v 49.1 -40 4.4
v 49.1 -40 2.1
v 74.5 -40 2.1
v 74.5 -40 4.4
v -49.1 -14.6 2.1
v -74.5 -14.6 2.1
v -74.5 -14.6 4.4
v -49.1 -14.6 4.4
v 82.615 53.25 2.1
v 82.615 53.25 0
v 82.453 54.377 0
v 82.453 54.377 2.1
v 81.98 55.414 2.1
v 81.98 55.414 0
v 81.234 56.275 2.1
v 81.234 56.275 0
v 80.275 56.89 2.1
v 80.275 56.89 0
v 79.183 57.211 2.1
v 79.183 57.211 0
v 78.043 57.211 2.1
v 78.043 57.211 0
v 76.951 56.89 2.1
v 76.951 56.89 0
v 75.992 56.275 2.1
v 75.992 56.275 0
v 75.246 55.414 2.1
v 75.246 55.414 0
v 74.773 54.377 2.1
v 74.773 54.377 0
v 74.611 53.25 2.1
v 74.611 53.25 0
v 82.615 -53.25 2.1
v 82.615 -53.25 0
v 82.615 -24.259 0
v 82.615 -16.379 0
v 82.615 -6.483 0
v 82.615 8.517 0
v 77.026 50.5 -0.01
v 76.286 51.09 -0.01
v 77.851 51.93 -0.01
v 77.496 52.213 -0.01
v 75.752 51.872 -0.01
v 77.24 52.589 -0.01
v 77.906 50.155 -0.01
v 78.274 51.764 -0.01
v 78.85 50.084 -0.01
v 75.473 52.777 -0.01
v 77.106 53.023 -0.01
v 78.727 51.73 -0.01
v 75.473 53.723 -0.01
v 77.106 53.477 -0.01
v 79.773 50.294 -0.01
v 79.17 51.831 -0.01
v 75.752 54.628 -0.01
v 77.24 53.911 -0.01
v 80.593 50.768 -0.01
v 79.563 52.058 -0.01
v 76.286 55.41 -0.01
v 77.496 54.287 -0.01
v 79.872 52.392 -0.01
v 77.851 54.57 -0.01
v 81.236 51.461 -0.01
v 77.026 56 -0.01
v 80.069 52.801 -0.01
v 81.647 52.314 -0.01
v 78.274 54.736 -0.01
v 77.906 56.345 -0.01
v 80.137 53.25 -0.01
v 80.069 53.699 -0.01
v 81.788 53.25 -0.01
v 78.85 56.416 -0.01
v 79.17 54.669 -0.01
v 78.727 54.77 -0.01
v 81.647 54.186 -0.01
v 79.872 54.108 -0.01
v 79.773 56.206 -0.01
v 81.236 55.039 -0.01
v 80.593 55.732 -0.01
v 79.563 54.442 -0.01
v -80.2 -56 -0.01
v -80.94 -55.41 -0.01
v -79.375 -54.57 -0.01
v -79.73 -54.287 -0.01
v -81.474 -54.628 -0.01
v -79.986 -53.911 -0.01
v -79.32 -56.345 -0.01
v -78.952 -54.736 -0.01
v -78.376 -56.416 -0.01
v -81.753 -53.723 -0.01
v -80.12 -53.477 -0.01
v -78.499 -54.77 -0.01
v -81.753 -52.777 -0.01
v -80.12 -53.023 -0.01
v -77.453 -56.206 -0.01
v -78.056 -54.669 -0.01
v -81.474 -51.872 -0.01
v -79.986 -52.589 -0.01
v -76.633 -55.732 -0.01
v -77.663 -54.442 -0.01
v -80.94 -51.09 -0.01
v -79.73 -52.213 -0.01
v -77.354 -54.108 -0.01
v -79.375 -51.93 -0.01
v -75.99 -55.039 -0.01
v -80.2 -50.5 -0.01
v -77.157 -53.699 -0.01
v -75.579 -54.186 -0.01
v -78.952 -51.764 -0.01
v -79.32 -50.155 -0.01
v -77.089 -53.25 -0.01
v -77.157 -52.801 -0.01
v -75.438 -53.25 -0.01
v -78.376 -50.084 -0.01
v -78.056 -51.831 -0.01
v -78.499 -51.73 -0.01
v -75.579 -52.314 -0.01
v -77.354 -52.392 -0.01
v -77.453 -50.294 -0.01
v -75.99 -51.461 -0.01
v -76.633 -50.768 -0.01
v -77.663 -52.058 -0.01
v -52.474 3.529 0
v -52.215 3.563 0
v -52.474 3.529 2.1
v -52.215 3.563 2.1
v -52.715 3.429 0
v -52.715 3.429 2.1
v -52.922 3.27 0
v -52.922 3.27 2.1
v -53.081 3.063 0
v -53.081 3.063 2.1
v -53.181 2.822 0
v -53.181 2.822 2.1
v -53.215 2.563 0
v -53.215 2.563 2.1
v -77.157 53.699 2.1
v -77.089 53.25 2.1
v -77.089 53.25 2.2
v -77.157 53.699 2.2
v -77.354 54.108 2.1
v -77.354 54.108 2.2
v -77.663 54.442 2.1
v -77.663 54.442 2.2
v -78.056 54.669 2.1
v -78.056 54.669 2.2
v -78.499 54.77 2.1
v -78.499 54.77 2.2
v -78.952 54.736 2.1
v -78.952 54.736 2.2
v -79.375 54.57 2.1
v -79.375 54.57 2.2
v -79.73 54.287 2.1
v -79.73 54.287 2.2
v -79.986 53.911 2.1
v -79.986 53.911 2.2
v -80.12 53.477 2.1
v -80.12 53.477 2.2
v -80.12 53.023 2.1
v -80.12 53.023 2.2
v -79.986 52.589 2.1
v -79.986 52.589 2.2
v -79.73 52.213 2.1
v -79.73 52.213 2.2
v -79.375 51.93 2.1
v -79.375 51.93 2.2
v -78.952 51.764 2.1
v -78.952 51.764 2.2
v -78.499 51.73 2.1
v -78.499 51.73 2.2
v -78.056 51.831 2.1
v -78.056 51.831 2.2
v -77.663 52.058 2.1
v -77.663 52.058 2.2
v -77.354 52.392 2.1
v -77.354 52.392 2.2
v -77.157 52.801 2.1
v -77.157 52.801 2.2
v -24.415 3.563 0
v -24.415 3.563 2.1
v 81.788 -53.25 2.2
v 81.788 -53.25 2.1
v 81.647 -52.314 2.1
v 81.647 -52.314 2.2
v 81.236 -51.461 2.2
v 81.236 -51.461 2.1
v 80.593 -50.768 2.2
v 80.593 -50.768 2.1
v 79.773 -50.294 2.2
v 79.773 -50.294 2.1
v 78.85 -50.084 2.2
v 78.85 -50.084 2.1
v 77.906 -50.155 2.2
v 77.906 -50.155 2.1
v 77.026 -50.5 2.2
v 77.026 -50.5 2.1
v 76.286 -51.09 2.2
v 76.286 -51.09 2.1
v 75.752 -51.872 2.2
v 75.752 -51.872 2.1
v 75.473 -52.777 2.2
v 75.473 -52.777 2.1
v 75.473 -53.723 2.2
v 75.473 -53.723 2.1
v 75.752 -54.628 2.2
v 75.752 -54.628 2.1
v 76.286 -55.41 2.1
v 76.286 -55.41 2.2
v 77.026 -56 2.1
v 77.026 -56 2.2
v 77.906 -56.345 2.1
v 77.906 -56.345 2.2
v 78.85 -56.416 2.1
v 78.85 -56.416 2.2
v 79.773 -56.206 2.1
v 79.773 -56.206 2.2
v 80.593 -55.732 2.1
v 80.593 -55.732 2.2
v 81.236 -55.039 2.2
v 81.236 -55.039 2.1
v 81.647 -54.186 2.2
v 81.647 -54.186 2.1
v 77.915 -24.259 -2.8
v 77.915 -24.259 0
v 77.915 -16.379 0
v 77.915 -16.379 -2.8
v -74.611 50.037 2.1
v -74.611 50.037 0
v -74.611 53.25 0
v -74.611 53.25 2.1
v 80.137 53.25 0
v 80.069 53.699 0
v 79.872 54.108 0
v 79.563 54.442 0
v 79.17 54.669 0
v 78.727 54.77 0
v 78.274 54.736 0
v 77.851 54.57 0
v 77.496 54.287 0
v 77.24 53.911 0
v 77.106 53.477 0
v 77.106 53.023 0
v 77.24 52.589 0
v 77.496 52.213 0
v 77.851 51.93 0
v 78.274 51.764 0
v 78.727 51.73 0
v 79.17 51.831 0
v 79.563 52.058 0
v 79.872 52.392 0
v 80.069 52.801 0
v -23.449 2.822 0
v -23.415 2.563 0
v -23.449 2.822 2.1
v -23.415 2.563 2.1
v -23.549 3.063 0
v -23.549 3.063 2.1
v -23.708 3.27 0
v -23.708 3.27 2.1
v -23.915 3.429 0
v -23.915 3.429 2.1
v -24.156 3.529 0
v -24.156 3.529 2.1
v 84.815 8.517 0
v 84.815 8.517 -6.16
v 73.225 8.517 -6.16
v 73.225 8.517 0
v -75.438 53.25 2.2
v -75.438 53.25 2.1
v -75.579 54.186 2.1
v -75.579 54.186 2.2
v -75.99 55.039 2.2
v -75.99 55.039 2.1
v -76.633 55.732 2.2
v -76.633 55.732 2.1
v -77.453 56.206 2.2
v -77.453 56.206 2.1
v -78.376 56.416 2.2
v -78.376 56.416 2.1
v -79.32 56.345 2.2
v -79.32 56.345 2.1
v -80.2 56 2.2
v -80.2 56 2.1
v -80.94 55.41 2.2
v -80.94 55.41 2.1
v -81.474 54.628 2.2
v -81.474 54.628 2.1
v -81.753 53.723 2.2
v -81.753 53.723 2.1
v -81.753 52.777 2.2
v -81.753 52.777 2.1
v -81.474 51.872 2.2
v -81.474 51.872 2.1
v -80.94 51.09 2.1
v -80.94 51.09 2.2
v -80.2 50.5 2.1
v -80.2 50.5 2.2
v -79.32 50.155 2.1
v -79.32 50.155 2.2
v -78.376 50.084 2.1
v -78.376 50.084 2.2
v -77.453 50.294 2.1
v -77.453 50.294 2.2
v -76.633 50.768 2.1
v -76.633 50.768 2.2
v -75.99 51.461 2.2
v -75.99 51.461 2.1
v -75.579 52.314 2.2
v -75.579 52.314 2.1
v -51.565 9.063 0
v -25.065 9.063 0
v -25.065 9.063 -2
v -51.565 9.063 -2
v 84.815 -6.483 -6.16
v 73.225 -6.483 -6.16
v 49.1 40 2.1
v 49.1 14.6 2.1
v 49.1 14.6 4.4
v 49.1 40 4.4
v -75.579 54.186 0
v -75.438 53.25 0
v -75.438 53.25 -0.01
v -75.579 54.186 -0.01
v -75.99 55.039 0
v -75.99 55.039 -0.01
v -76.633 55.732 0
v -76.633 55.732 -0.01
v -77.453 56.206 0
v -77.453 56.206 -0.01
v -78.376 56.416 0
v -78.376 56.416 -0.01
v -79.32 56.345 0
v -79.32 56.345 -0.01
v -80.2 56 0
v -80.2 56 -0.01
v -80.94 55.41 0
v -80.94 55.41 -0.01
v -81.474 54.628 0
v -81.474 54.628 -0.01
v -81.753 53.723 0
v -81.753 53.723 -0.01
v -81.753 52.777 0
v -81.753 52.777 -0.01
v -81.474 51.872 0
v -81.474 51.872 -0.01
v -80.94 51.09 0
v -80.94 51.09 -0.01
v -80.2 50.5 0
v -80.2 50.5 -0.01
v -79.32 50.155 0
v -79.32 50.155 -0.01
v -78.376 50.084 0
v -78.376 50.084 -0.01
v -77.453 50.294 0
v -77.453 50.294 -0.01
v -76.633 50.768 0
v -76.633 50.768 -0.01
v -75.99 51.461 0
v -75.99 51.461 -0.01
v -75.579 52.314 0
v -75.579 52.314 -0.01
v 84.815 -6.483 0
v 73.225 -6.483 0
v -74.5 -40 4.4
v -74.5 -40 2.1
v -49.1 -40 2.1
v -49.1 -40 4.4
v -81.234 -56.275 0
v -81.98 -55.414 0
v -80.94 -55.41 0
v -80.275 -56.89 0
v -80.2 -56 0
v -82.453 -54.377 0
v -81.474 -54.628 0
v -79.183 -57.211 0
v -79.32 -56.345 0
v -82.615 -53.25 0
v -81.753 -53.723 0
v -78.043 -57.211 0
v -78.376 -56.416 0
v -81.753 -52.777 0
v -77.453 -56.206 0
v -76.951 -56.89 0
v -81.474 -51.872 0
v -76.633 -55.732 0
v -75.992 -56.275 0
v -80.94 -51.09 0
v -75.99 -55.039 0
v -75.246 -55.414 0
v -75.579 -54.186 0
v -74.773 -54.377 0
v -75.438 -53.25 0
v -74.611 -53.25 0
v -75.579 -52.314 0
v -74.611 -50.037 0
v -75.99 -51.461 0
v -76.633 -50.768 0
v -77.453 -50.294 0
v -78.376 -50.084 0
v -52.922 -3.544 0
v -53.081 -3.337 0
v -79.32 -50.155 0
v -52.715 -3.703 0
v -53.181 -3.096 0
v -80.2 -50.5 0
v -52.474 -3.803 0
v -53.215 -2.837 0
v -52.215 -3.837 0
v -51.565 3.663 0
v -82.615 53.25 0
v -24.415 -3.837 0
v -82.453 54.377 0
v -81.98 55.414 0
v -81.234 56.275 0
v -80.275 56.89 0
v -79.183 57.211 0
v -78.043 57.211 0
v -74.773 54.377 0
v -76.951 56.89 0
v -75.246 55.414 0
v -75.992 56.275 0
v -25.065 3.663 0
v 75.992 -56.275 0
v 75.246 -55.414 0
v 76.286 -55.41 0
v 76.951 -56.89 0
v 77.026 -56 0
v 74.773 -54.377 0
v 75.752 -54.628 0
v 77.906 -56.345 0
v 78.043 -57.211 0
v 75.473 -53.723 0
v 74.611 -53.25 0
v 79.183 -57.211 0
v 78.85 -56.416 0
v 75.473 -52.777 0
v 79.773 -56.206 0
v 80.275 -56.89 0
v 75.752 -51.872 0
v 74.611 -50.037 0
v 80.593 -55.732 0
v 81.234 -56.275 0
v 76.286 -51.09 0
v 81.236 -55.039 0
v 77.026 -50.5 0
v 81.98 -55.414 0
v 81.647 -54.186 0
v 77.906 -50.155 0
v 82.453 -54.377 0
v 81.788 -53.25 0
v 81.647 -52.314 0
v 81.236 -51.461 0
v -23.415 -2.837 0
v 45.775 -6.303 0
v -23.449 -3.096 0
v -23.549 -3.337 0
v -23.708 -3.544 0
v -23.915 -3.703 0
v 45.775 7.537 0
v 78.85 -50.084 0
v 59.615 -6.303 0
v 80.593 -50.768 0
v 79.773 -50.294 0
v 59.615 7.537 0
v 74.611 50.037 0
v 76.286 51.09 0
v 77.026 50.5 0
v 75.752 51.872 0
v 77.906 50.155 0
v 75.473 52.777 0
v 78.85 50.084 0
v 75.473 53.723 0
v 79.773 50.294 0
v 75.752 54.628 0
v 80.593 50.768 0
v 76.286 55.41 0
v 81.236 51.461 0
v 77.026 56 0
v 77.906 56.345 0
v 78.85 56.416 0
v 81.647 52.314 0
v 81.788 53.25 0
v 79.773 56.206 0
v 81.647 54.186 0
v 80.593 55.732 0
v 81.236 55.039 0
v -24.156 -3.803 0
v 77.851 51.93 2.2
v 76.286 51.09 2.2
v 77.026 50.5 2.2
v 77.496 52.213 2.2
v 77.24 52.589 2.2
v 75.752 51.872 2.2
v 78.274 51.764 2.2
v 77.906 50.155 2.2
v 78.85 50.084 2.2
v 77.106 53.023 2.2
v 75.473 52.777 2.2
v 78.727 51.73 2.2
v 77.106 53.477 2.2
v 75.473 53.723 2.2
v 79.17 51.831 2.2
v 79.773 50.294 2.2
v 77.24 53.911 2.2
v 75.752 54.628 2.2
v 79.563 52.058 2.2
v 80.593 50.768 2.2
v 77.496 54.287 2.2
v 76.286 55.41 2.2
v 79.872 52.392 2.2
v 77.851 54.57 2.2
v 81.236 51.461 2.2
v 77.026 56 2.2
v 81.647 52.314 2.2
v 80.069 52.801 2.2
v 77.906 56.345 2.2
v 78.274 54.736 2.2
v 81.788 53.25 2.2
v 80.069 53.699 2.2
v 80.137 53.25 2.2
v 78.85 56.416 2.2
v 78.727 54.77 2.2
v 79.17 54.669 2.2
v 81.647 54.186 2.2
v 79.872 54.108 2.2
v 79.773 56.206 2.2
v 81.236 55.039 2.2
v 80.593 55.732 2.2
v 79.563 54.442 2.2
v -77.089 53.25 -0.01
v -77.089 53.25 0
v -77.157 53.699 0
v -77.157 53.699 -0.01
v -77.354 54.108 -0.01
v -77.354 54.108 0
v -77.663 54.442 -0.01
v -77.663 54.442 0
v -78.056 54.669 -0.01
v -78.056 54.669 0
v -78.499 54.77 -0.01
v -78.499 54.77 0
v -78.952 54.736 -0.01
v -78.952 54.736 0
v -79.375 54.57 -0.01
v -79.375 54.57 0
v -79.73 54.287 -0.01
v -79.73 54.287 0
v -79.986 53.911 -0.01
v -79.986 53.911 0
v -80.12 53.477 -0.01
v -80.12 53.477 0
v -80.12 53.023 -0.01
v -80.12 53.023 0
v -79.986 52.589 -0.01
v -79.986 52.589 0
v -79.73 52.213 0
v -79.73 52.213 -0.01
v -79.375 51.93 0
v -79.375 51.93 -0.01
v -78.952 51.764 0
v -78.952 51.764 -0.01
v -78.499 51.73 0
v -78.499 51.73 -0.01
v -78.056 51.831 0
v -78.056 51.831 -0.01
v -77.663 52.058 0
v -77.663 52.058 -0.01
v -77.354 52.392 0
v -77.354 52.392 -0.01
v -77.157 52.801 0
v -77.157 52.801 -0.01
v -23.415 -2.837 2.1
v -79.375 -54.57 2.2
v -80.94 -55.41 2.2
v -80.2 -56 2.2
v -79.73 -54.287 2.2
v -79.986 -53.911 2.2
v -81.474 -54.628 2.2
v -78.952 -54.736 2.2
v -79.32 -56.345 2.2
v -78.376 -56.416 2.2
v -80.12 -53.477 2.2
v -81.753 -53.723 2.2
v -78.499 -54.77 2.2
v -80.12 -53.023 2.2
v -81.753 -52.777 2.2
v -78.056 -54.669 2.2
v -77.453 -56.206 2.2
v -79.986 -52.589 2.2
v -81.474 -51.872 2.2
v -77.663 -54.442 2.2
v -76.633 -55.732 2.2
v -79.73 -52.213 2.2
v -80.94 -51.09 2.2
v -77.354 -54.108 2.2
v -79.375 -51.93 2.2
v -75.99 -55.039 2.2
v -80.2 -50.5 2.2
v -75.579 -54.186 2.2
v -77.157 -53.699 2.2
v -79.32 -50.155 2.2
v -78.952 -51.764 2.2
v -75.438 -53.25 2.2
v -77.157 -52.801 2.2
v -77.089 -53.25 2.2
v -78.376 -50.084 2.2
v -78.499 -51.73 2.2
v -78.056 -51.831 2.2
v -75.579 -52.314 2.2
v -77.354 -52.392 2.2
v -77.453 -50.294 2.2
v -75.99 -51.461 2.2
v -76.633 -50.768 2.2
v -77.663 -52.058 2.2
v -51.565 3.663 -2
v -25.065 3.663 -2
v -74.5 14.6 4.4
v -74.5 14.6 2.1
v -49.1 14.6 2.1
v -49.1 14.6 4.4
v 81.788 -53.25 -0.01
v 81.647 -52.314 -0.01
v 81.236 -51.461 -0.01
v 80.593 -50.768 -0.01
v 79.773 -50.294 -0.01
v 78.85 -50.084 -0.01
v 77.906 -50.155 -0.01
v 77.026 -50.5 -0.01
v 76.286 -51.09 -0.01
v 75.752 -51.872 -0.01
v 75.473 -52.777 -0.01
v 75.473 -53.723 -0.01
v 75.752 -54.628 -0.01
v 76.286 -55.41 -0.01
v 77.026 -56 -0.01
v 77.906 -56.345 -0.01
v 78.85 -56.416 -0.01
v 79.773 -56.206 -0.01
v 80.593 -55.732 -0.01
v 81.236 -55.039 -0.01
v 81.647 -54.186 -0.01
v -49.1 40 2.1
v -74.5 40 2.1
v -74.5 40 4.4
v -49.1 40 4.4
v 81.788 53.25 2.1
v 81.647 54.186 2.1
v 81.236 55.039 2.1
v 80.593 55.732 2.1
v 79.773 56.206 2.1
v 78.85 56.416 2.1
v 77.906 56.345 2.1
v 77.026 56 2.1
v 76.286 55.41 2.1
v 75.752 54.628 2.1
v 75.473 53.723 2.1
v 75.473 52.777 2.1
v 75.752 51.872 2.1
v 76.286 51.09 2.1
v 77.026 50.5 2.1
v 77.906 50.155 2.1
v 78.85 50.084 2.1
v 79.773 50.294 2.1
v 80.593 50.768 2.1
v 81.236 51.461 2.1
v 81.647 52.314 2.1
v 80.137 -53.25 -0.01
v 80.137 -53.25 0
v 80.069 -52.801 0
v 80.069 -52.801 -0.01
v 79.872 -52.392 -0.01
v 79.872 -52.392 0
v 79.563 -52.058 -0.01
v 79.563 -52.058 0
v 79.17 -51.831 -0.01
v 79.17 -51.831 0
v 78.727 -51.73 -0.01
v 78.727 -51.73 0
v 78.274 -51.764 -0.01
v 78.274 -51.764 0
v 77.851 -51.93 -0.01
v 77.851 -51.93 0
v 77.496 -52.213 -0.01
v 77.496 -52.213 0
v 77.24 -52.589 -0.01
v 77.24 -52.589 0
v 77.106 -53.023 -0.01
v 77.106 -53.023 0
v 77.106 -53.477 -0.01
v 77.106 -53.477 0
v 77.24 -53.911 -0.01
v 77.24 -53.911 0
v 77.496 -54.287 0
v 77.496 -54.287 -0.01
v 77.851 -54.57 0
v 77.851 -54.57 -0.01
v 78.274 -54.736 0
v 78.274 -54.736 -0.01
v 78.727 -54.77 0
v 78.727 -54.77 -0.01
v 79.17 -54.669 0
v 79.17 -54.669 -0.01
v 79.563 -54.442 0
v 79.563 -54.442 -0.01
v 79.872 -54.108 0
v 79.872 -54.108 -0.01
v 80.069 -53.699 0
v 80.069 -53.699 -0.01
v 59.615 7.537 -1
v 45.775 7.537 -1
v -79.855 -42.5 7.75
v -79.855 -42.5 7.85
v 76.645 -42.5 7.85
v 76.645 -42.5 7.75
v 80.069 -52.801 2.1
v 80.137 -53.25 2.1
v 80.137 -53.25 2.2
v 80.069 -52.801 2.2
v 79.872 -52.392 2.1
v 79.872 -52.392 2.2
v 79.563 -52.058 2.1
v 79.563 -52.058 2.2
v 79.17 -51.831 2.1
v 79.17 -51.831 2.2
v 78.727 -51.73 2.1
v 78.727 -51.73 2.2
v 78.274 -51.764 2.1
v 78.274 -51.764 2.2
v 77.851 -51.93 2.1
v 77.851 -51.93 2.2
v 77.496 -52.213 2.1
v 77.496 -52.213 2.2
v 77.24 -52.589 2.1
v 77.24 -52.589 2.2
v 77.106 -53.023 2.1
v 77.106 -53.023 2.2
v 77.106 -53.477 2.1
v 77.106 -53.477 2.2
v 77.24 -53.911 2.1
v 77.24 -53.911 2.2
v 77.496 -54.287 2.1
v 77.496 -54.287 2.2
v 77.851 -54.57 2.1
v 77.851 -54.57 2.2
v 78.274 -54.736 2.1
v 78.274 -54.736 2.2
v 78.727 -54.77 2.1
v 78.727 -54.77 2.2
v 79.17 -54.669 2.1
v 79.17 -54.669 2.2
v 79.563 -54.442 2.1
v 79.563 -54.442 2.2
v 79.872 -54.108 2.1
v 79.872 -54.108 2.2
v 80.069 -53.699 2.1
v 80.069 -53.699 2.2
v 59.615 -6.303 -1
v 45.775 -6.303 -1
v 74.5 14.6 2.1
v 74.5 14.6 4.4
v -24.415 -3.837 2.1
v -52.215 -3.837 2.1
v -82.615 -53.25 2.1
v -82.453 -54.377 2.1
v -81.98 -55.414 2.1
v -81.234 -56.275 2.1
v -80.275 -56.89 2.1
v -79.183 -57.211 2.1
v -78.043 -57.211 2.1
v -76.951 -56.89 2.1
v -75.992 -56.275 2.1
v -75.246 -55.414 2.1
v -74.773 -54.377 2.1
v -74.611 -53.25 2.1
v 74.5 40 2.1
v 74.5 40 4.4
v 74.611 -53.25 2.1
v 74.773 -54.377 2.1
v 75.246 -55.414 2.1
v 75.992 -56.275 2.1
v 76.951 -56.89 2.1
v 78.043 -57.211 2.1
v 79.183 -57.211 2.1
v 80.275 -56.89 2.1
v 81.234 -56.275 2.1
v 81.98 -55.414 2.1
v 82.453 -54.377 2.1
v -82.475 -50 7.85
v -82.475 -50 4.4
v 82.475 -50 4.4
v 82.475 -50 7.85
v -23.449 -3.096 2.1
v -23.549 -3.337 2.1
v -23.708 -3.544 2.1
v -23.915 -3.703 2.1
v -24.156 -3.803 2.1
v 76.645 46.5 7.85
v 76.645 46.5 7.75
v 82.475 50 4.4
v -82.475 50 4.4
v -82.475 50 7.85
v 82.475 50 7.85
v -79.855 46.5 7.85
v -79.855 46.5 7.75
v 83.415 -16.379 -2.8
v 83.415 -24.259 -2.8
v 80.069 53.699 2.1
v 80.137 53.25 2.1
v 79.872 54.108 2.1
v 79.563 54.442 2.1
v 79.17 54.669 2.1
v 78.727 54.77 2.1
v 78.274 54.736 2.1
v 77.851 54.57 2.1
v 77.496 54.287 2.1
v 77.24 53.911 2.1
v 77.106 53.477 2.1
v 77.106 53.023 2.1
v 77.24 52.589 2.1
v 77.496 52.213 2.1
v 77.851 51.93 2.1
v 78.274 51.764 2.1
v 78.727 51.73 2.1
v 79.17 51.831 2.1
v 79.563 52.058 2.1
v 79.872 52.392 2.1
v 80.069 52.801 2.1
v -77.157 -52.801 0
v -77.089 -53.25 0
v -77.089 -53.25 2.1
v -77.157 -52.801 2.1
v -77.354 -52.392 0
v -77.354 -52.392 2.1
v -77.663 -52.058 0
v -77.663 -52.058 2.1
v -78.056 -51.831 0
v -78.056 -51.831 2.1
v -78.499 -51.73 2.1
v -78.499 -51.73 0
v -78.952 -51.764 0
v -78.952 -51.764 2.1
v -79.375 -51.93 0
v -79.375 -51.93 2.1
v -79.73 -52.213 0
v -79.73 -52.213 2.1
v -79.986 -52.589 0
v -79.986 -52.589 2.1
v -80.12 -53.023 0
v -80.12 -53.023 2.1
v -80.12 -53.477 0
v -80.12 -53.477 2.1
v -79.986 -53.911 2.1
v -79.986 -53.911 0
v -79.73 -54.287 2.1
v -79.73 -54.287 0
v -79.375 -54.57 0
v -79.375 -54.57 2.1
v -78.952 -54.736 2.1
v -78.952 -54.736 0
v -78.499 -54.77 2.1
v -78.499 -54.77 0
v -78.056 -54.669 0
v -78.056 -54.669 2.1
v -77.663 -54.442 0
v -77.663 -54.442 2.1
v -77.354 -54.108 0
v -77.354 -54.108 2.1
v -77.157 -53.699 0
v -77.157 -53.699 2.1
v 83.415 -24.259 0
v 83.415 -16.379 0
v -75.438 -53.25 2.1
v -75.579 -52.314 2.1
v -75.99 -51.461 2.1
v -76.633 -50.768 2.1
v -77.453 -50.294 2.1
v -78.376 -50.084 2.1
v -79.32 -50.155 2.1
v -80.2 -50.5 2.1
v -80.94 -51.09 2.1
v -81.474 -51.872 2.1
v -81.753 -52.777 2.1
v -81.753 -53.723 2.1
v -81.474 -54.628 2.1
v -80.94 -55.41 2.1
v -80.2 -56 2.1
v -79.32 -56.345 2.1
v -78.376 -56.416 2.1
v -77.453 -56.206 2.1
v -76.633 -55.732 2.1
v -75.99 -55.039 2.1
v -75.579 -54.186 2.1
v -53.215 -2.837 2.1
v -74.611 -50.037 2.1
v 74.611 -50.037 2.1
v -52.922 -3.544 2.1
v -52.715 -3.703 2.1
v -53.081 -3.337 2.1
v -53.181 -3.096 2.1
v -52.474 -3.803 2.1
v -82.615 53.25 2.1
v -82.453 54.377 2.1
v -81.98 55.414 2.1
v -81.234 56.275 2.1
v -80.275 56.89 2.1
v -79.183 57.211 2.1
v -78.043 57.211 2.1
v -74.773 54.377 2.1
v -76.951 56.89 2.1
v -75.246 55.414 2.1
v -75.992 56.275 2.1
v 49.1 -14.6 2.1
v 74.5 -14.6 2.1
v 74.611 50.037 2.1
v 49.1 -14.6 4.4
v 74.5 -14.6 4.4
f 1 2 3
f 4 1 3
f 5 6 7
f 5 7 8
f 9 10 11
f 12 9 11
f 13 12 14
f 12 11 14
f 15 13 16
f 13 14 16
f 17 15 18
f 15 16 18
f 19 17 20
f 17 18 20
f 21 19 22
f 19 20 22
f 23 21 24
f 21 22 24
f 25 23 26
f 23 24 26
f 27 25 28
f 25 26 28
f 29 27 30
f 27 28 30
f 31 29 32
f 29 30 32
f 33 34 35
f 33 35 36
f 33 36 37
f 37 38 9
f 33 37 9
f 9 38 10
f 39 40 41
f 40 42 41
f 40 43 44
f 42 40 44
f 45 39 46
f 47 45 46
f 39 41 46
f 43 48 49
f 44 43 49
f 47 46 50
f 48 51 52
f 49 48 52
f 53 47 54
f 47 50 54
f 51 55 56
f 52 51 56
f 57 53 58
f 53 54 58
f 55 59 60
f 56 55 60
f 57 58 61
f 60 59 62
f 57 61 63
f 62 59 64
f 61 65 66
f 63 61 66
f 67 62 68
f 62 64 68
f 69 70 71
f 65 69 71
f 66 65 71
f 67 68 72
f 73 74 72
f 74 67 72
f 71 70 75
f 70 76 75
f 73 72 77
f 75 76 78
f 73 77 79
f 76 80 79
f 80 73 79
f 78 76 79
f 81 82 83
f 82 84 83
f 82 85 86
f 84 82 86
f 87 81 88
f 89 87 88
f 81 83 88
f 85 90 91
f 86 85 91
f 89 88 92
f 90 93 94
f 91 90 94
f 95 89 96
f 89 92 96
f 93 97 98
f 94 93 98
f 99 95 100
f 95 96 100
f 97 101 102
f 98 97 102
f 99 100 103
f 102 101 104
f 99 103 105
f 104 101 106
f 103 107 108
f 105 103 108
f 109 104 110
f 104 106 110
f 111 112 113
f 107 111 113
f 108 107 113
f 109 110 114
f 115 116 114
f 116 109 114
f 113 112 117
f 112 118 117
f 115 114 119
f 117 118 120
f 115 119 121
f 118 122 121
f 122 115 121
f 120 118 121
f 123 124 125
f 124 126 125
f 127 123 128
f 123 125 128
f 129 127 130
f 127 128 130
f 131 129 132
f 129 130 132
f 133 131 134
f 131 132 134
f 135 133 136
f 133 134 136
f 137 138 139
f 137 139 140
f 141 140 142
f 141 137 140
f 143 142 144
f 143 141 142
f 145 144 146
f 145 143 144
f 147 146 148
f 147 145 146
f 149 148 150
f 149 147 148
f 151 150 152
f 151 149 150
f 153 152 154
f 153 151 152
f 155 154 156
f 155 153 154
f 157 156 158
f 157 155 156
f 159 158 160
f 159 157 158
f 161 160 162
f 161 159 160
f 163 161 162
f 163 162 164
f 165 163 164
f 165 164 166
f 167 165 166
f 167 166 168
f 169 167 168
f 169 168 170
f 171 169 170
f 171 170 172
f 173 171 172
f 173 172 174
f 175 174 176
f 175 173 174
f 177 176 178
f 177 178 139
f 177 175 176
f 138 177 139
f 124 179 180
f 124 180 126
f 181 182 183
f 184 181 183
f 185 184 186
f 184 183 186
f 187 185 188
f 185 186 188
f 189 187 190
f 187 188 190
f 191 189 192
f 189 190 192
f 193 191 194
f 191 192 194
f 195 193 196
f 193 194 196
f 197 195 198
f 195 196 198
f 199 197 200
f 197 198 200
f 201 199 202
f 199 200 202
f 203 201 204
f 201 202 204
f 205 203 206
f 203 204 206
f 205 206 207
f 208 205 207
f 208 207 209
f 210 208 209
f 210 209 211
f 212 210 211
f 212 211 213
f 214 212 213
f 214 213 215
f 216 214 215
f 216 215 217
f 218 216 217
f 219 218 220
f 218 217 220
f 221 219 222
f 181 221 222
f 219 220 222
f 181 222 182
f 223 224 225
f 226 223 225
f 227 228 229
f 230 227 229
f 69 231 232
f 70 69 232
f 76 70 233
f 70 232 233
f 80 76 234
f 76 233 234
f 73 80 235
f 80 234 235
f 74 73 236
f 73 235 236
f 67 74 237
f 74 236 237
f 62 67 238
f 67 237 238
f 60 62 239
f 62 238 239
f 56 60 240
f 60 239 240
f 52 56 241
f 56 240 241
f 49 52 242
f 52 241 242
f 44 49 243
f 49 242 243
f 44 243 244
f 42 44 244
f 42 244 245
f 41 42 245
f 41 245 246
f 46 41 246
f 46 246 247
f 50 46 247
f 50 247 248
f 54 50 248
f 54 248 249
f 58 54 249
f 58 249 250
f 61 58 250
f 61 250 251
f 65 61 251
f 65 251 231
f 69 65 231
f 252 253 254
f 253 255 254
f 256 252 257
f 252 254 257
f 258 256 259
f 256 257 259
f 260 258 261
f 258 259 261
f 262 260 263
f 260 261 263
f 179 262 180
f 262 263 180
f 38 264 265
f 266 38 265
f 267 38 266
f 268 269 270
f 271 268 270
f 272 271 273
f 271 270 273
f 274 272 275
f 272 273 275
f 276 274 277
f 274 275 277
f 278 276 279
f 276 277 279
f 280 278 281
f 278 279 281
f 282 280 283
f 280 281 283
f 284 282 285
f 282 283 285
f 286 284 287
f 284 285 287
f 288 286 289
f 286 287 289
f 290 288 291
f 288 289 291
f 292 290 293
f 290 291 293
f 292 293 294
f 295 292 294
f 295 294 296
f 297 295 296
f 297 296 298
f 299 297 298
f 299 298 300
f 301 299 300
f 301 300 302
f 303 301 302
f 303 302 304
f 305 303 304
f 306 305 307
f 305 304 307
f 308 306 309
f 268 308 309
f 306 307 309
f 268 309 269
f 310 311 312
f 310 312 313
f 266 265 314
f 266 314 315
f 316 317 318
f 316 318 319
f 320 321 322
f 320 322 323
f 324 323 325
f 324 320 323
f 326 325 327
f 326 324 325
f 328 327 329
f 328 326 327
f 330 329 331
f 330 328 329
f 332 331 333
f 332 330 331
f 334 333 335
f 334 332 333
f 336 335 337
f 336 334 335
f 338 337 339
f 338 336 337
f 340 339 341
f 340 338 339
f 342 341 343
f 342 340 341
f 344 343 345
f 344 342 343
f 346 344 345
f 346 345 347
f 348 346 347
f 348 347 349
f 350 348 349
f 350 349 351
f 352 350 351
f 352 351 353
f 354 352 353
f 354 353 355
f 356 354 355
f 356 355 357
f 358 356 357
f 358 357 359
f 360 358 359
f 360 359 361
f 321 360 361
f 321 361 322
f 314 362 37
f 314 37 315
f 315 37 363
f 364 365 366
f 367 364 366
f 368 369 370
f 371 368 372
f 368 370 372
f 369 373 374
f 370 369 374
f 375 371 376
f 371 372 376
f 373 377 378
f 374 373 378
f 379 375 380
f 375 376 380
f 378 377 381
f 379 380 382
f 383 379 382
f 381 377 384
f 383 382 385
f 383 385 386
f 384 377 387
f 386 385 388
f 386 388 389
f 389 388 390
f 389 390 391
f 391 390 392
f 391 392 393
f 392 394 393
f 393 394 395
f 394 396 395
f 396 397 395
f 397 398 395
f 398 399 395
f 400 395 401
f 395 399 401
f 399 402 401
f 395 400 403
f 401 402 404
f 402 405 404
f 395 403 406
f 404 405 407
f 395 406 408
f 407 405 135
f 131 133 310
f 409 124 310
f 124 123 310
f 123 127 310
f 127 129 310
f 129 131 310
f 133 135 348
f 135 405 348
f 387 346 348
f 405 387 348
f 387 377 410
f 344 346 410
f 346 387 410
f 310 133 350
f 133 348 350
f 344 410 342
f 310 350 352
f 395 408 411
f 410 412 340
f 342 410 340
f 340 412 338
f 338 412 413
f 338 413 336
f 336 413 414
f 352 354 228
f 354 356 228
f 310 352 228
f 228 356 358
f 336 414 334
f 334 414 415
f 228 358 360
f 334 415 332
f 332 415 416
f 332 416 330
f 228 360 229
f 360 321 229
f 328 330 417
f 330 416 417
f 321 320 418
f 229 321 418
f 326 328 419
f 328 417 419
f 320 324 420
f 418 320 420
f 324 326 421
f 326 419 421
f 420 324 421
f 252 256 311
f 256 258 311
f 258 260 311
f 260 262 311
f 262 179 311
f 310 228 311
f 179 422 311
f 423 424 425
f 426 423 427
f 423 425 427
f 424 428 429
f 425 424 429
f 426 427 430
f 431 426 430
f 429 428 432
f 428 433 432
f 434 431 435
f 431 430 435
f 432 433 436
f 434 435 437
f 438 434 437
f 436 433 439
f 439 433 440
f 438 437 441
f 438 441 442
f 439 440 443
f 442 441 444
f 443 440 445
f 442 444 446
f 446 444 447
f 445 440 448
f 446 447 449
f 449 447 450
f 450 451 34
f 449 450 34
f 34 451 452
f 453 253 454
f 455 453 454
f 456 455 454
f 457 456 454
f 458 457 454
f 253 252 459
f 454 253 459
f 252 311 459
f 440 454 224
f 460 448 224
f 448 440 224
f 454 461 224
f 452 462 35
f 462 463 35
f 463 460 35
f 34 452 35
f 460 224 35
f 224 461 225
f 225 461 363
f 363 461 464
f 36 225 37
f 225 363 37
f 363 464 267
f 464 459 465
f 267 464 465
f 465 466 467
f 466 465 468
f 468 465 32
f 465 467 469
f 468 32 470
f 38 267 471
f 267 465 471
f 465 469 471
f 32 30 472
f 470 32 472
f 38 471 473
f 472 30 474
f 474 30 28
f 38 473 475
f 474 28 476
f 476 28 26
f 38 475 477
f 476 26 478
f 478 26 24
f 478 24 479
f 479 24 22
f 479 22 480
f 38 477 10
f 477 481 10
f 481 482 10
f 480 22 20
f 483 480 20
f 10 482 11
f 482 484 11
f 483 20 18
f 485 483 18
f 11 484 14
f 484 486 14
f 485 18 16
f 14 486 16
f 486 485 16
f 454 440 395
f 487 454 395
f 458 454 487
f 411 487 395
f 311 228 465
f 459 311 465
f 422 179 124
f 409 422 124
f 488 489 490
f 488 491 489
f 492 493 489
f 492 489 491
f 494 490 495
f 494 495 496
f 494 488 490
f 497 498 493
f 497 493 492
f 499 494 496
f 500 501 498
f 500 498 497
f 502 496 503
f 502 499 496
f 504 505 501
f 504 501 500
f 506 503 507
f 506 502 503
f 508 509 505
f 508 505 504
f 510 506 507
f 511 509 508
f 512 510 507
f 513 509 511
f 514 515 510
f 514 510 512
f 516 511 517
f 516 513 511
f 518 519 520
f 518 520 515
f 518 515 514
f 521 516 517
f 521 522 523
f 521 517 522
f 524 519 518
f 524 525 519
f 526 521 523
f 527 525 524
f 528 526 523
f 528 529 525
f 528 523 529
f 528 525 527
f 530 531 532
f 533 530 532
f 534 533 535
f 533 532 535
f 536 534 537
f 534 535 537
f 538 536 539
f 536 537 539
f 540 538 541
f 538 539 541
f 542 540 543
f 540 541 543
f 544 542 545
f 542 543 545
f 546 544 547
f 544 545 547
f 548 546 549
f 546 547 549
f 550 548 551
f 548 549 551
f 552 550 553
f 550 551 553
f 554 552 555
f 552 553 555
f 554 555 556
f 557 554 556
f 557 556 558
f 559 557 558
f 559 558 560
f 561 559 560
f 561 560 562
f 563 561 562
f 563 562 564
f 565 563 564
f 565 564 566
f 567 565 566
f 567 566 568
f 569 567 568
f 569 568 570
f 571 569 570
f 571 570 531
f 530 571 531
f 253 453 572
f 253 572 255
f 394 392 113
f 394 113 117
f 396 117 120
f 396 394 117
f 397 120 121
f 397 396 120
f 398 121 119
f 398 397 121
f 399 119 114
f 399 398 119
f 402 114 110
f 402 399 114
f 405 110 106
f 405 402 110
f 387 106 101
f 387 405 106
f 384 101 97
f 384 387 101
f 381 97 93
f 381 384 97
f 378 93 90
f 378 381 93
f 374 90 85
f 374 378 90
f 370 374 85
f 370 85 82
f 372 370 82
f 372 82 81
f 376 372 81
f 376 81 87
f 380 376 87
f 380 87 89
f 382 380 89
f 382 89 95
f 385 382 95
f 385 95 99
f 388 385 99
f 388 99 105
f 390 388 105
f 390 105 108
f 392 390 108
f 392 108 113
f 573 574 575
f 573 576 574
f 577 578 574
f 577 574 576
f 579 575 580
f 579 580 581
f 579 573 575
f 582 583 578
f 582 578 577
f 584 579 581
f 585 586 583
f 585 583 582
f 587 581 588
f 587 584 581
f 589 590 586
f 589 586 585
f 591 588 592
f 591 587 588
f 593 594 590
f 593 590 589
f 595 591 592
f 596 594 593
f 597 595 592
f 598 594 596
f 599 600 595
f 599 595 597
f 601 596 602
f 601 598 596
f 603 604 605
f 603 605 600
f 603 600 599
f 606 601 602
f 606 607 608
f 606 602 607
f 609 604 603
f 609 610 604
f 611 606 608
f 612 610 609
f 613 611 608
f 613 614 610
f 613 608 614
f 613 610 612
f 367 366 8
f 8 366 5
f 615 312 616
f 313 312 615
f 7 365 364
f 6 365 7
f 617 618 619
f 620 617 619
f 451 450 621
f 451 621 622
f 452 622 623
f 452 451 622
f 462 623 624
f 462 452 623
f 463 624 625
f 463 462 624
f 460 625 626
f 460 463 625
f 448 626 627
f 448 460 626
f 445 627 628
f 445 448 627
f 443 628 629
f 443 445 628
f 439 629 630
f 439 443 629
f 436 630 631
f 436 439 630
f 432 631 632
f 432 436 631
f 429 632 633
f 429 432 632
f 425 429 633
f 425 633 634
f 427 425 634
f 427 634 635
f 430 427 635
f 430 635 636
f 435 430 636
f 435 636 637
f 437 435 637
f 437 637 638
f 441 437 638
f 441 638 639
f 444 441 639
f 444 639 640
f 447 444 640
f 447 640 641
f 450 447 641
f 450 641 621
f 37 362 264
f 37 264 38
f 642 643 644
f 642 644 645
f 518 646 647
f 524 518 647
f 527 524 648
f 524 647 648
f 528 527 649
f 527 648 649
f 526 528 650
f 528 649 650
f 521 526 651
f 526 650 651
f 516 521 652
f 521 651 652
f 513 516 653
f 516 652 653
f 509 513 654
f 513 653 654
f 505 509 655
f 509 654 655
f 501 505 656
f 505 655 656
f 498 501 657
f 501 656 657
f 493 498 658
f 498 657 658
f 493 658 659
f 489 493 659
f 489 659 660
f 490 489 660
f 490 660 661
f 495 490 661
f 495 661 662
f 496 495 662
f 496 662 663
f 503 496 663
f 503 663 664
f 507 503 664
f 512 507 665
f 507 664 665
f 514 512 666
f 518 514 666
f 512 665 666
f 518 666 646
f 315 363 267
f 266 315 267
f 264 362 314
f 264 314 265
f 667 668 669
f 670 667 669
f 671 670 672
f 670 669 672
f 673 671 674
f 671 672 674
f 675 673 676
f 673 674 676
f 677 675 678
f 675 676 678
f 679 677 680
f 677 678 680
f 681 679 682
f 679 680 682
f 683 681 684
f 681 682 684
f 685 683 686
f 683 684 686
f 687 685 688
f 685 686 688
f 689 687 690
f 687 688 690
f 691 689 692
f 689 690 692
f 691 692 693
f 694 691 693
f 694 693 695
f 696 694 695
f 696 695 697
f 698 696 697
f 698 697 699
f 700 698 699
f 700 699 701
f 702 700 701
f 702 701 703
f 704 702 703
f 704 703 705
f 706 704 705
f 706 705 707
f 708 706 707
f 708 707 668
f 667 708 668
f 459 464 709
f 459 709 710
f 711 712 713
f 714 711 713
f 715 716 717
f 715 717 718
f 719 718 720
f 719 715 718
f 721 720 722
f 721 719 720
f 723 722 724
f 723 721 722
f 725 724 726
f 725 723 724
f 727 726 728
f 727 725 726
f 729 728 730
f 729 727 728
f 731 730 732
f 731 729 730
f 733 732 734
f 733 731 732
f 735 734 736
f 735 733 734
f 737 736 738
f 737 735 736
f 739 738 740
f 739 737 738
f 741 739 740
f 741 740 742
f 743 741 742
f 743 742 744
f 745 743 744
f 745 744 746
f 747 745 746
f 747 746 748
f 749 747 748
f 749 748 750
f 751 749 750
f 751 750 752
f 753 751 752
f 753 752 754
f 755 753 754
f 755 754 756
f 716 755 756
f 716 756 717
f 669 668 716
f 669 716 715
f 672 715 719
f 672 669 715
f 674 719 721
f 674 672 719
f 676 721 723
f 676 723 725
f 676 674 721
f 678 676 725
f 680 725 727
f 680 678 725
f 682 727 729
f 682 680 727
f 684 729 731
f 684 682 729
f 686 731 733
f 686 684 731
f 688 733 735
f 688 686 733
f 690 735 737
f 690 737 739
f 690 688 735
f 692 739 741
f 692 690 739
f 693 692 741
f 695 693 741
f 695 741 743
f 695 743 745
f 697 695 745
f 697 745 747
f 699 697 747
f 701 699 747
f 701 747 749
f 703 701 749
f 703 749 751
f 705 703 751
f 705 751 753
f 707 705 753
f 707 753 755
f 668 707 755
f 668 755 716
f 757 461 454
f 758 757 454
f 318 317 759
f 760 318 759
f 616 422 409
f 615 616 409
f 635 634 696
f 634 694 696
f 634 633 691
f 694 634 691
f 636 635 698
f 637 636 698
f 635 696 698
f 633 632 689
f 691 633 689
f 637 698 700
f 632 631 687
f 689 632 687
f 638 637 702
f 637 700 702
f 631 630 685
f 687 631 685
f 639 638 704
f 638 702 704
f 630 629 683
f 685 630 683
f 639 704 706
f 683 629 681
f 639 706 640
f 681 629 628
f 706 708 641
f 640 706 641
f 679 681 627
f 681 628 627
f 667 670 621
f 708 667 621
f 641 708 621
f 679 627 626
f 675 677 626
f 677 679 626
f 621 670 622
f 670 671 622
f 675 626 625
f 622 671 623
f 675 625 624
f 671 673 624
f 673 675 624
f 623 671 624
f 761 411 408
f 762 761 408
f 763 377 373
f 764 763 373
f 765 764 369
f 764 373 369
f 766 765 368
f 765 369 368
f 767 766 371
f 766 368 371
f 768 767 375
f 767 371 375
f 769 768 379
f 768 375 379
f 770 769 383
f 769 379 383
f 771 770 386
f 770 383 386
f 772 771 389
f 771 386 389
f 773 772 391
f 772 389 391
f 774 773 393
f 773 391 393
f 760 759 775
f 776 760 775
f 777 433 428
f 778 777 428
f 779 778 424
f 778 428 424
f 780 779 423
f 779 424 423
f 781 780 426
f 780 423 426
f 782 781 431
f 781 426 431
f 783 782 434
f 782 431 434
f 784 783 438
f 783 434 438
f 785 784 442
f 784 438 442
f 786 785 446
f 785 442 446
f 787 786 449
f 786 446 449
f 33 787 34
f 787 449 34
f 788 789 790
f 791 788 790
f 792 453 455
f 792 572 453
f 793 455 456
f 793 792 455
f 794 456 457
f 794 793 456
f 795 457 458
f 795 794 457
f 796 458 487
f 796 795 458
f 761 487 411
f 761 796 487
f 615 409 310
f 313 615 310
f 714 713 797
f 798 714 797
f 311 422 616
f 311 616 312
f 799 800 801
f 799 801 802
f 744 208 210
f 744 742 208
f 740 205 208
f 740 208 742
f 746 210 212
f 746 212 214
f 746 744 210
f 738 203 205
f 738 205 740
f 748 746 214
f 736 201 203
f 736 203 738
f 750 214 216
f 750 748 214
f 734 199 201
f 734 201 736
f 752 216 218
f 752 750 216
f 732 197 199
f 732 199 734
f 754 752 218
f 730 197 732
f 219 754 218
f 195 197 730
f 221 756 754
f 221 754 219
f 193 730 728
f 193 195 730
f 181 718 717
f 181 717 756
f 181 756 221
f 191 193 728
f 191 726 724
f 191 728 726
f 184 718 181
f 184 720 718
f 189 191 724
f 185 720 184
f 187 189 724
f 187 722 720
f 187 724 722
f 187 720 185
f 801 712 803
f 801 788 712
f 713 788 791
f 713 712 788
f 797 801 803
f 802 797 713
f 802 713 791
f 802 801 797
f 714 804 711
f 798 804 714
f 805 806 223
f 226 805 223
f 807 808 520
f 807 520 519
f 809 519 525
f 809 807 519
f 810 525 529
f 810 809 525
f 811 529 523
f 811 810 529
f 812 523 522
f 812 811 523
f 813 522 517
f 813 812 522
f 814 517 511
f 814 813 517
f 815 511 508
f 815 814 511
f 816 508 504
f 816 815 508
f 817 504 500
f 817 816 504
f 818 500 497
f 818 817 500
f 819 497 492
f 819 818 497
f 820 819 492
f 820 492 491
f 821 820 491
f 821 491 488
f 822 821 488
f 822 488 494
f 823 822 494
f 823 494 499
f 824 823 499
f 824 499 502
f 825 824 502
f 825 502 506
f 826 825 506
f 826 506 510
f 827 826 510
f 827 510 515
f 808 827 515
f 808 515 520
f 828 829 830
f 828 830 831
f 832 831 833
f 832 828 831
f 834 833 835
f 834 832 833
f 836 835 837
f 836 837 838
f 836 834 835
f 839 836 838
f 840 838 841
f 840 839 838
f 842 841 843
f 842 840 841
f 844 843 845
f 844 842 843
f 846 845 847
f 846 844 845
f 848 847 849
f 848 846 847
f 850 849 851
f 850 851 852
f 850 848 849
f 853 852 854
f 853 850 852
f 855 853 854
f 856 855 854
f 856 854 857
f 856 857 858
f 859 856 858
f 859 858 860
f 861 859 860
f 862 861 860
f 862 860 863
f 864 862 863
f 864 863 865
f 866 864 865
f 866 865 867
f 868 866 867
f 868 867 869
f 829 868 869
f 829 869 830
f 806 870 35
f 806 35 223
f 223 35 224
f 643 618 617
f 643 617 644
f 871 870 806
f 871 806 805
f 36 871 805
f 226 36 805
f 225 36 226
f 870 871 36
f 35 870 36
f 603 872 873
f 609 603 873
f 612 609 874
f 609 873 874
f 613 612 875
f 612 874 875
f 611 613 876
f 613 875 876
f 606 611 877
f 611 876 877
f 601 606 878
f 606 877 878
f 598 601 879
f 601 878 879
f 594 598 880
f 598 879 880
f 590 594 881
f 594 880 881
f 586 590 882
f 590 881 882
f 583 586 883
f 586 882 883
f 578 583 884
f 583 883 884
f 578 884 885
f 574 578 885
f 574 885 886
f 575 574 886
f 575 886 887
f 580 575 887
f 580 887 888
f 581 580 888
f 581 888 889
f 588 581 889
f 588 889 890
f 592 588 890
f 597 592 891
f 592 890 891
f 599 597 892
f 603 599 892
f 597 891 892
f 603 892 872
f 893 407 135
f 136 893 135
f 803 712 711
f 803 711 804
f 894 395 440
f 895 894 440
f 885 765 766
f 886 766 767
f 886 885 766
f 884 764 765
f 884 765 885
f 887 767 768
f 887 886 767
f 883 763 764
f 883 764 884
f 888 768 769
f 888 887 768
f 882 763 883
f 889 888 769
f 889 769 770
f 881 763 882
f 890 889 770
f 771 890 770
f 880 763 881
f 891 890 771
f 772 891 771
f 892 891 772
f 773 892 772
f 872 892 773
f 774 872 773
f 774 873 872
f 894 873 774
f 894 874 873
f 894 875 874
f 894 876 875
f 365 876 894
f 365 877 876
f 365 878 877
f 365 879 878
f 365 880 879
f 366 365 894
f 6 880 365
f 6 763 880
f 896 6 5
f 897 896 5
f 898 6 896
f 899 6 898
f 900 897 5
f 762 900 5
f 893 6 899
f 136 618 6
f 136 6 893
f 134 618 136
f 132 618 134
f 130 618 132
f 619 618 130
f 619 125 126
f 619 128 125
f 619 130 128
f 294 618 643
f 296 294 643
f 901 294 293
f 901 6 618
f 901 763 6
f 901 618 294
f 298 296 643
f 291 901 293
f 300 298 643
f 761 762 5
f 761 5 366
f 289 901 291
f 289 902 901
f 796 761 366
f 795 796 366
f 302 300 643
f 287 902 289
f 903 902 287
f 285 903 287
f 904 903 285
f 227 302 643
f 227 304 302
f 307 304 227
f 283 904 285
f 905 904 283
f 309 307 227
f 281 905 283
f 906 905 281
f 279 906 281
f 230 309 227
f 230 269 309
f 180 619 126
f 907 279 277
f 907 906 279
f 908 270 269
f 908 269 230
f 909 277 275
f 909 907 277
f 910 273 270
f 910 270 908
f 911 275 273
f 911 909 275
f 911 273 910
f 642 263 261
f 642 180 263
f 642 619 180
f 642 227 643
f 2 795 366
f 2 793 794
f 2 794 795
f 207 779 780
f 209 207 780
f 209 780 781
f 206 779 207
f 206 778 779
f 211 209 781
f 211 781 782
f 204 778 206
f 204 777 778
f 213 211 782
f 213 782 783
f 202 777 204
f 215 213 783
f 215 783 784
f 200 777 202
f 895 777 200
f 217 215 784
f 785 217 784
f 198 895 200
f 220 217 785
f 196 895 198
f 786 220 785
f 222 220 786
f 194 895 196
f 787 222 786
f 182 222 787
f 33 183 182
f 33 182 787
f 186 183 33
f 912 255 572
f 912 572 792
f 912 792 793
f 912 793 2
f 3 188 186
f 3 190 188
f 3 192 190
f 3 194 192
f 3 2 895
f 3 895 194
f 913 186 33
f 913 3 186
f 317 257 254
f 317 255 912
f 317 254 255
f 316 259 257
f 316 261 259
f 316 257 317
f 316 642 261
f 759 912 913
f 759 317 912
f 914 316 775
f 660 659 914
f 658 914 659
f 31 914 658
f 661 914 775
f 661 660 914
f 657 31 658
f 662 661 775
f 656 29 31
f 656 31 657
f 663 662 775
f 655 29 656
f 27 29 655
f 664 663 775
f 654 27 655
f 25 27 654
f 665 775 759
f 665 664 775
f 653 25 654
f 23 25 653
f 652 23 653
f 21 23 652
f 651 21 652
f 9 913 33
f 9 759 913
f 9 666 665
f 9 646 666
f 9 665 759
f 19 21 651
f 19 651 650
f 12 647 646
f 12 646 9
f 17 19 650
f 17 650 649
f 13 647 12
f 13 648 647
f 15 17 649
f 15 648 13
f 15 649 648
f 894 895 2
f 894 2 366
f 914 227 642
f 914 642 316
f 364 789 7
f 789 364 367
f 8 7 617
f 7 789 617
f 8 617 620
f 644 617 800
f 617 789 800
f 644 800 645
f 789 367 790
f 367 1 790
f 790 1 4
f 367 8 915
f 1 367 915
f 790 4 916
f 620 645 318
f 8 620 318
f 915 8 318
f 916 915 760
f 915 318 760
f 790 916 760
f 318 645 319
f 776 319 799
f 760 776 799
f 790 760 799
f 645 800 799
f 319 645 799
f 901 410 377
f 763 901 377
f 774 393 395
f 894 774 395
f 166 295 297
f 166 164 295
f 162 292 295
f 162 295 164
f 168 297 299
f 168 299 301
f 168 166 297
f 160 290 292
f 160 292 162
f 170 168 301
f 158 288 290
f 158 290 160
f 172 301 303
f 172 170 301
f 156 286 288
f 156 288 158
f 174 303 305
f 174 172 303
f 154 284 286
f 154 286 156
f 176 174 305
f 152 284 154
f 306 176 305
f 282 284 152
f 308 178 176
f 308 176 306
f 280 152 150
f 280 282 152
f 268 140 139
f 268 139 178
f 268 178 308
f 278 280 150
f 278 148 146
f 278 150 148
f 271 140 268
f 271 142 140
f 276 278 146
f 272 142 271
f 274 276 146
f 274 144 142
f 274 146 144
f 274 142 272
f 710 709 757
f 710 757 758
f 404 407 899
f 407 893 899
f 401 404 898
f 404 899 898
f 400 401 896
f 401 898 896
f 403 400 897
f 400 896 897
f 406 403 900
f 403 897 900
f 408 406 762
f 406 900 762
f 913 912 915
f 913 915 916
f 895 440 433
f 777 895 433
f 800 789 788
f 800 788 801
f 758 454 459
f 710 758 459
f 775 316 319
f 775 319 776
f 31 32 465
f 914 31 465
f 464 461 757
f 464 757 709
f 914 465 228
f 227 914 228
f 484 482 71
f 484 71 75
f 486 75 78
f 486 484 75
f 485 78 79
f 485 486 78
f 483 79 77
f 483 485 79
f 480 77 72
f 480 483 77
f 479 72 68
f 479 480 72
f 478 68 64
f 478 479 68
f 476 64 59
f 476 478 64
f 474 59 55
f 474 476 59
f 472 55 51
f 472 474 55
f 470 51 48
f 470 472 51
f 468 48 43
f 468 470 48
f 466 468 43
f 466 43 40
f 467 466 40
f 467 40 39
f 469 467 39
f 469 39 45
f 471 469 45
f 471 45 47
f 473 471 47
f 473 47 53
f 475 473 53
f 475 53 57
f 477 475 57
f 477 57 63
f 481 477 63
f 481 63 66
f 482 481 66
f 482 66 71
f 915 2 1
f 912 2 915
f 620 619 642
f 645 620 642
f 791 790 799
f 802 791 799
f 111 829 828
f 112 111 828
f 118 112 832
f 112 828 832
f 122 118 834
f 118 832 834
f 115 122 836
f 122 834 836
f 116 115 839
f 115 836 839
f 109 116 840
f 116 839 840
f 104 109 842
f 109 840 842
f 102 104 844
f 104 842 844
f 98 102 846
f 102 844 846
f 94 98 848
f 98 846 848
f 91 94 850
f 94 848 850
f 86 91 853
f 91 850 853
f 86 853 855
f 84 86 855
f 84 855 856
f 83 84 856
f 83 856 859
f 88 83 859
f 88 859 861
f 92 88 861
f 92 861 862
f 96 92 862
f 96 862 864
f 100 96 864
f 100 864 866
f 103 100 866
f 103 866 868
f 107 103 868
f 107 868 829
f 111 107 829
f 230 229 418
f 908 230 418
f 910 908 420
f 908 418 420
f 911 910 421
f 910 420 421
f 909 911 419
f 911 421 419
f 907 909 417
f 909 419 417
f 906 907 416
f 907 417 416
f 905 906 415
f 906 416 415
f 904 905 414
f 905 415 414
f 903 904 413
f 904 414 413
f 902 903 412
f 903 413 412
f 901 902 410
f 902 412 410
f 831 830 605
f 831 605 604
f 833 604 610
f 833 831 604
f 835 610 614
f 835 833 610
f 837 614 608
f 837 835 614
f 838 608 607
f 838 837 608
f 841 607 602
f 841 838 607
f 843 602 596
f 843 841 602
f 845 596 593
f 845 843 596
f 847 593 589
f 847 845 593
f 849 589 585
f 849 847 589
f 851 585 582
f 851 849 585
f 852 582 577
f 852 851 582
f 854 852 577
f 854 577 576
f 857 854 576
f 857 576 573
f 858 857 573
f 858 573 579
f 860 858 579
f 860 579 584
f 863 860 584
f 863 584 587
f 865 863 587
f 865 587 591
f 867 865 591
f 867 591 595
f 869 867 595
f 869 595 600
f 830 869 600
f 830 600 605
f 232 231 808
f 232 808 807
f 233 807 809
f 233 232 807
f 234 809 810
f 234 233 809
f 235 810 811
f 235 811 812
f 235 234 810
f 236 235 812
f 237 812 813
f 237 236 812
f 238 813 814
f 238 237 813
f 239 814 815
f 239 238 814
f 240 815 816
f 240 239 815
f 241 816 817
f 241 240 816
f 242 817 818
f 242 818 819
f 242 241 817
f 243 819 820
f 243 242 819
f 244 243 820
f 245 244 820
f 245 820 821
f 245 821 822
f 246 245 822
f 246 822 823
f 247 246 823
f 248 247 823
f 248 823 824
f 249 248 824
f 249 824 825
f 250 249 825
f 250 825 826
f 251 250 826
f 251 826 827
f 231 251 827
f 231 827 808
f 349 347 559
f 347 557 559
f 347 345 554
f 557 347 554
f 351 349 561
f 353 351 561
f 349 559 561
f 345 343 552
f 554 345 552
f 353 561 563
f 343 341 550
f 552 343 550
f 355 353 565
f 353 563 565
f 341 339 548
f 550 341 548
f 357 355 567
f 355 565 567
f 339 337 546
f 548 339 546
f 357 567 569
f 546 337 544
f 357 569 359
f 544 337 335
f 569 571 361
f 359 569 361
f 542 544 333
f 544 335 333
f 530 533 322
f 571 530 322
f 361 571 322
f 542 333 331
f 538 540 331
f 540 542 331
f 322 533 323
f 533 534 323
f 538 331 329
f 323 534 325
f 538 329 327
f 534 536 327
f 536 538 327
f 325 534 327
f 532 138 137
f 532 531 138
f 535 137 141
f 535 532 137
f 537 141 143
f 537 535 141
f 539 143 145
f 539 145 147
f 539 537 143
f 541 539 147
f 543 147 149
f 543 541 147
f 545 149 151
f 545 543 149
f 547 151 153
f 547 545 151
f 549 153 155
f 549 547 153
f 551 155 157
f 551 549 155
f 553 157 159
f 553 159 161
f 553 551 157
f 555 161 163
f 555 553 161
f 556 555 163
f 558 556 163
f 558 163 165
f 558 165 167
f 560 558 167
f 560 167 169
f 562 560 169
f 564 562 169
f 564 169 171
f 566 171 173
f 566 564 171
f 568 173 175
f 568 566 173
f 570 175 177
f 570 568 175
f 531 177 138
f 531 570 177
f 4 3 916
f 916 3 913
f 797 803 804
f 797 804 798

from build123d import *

# Parameters (mm, degrees)
ESQUISSE1_R             = 1.524
BOSS_EXTRU_1_DEPTH      = 2.1
ESQUISSE2_W             = 25.4
ESQUISSE2_H             = 25.4
BOSS_EXTRU_2_DEPTH      = 2.3
ESQUISSE3_W             = 164.95
ESQUISSE3_H             = 100
BOSS_EXTRU_3_DEPTH      = 3.45
ESQUISSE4_W             = 156.5
ESQUISSE4_H             = 89
ENL_V_MAT_EXTRU_1_DEPTH = 0.1
ESQUISSE5_W             = 29.8
ESQUISSE5_H             = 7.4
ENL_V_MAT_EXTRU_2_DEPTH = 2.1
CONG_1_R                = 1
ESQUISSE6_W             = 26.5
ESQUISSE6_H             = 5.4
BOSS_EXTRU_4_DEPTH      = 2
ESQUISSE7_W             = 11.59
ESQUISSE7_H             = 15
BOSS_EXTRU_5_DEPTH      = 6.16
ESQUISSE8_W             = 5.5
ESQUISSE8_H             = 7.88
BOSS_EXTRU_6_DEPTH      = 2.8
ESQUISSE9_W             = 13.84
ESQUISSE9_H             = 13.84
BOSS_EXTRU_7_DEPTH      = 1
ESQUISSE10_R            = 3.175
ESQUISSE10_R_2          = 1.524
BOSS_EXTRU_8_DEPTH      = 0.1
BOSS_EXTRU_8_DEPTH_BACK = 2.11


with BuildPart() as part:
    # Esquisse1 → Boss.-Extru.1 (new body)
    with BuildSketch(Plane.XY):
        with BuildLine():
            Line((-82.615, 53.25), (-82.615, -53.25))
            ThreePointArc((-82.615, -53.25), (-78.613, -57.252), (-74.611, -53.25))
            Line((-74.611, -53.25), (-74.611, -50.036793886))
            Line((-74.611, -50.036793886), (74.611, -50.036793886))
            Line((74.611, -50.036793886), (74.611, -53.25))
            ThreePointArc((74.611, -53.25), (78.613, -57.252), (82.615, -53.25))
            Line((82.615, -53.25), (82.615, 53.25))
            ThreePointArc((82.615, 53.25), (78.613, 57.252), (74.611, 53.25))
            Line((74.611, 53.25), (74.611, 50.036793886))
            Line((74.611, 50.036793886), (-74.611, 50.036793886))
            Line((-74.611, 50.036793886), (-74.611, 53.25))
            ThreePointArc((-74.611, 53.25), (-78.613, 57.252), (-82.615, 53.25))
        make_face()
        with Locations((-78.613, 53.25)):
            Circle(ESQUISSE1_R, mode=Mode.SUBTRACT)
        with Locations((-78.613, -53.25)):
            Circle(ESQUISSE1_R, mode=Mode.SUBTRACT)
        with Locations((78.613, -53.25)):
            Circle(ESQUISSE1_R, mode=Mode.SUBTRACT)
        with Locations((78.613, 53.25)):
            Circle(ESQUISSE1_R, mode=Mode.SUBTRACT)
    extrude(amount=BOSS_EXTRU_1_DEPTH)

    # Esquisse2 → Boss.-Extru.2 (add)
    with BuildSketch(Plane.XY.offset(2.1)):
        with Locations((-61.8, 27.3)):
            Rectangle(ESQUISSE2_W, ESQUISSE2_H)
        with Locations((-61.8, -27.3)):
            Rectangle(ESQUISSE2_W, ESQUISSE2_H)
        with Locations((61.8, 27.3)):
            Rectangle(ESQUISSE2_W, ESQUISSE2_H)
        with Locations((61.8, -27.3)):
            Rectangle(ESQUISSE2_W, ESQUISSE2_H)
    extrude(amount=BOSS_EXTRU_2_DEPTH)

    # Esquisse3 → Boss.-Extru.3 (add)
    with BuildSketch(Plane.XY.offset(4.4)):
        Rectangle(ESQUISSE3_W, ESQUISSE3_H)
    extrude(amount=BOSS_EXTRU_3_DEPTH)

    # Esquisse4 → Enlèv. mat.-Extru.1 (cut)
    with BuildSketch(Plane.XY.offset(7.85)):
        with Locations((-1.605, 2)):
            Rectangle(ESQUISSE4_W, ESQUISSE4_H)
    extrude(amount=-ENL_V_MAT_EXTRU_1_DEPTH, mode=Mode.SUBTRACT)

    # Esquisse5 → Enlèv. mat.-Extru.2 (cut)
    with BuildSketch(Plane(origin=(0, 0, 0), x_dir=(-1, 0, 0), z_dir=(0, 0, -1))):
        with Locations((38.315, -0.136793886)):
            Rectangle(ESQUISSE5_W, ESQUISSE5_H)
    extrude(amount=-ENL_V_MAT_EXTRU_2_DEPTH, mode=Mode.SUBTRACT)

    # Congé1
    cong_1_edges = [part.edges().sort_by_distance(p)[0] for p in [
        (-23.415, -3.836793886, 1.05),
        (-23.415, 3.563206114, 1.05),
        (-53.215, 3.563206114, 1.05),
        (-53.215, -3.836793886, 1.05),
    ]]
    fillet(cong_1_edges, radius=CONG_1_R)

    # Esquisse6 → Boss.-Extru.4 (add)
    with BuildSketch(Plane(origin=(0, 0, 0), x_dir=(-1, 0, 0), z_dir=(0, 0, -1))):
        with Locations((38.315, 6.363206114)):
            Rectangle(ESQUISSE6_W, ESQUISSE6_H)
    extrude(amount=BOSS_EXTRU_4_DEPTH)

    # Esquisse7 → Boss.-Extru.5 (add)
    with BuildSketch(Plane(origin=(0, 0, 0), x_dir=(-1, 0, 0), z_dir=(0, 0, -1))):
        with Locations((-79.02, 1.017206114)):
            Rectangle(ESQUISSE7_W, ESQUISSE7_H)
    extrude(amount=BOSS_EXTRU_5_DEPTH)

    # Esquisse8 → Boss.-Extru.6 (add)
    with BuildSketch(Plane(origin=(0, 0, 0), x_dir=(-1, 0, 0), z_dir=(0, 0, -1))):
        with Locations((-80.665, -20.318793886)):
            Rectangle(ESQUISSE8_W, ESQUISSE8_H)
    extrude(amount=BOSS_EXTRU_6_DEPTH)

    # Esquisse9 → Boss.-Extru.7 (add)
    with BuildSketch(Plane(origin=(0, 0, 0), x_dir=(-1, 0, 0), z_dir=(0, 0, -1))):
        with Locations((-52.695, 0.616793886)):
            Rectangle(ESQUISSE9_W, ESQUISSE9_H)
    extrude(amount=BOSS_EXTRU_7_DEPTH)

    # Esquisse10 → Boss.-Extru.8 (add, two sides)
    with BuildSketch(Plane.XY.offset(2.1)) as boss_extru_8_sk:
        with Locations((-78.613, 53.25)):
            Circle(ESQUISSE10_R)
        with Locations((-78.613, 53.25)):
            Circle(ESQUISSE10_R_2, mode=Mode.SUBTRACT)
        with Locations((-78.613, -53.25)):
            Circle(ESQUISSE10_R)
        with Locations((-78.613, -53.25)):
            Circle(ESQUISSE10_R_2, mode=Mode.SUBTRACT)
        with Locations((78.613, -53.25)):
            Circle(ESQUISSE10_R)
        with Locations((78.613, -53.25)):
            Circle(ESQUISSE10_R_2, mode=Mode.SUBTRACT)
        with Locations((78.613, 53.25)):
            Circle(ESQUISSE10_R)
        with Locations((78.613, 53.25)):
            Circle(ESQUISSE10_R_2, mode=Mode.SUBTRACT)
    extrude(amount=BOSS_EXTRU_8_DEPTH)
    extrude(boss_extru_8_sk.sketch, amount=-BOSS_EXTRU_8_DEPTH_BACK)


solid = part.part
